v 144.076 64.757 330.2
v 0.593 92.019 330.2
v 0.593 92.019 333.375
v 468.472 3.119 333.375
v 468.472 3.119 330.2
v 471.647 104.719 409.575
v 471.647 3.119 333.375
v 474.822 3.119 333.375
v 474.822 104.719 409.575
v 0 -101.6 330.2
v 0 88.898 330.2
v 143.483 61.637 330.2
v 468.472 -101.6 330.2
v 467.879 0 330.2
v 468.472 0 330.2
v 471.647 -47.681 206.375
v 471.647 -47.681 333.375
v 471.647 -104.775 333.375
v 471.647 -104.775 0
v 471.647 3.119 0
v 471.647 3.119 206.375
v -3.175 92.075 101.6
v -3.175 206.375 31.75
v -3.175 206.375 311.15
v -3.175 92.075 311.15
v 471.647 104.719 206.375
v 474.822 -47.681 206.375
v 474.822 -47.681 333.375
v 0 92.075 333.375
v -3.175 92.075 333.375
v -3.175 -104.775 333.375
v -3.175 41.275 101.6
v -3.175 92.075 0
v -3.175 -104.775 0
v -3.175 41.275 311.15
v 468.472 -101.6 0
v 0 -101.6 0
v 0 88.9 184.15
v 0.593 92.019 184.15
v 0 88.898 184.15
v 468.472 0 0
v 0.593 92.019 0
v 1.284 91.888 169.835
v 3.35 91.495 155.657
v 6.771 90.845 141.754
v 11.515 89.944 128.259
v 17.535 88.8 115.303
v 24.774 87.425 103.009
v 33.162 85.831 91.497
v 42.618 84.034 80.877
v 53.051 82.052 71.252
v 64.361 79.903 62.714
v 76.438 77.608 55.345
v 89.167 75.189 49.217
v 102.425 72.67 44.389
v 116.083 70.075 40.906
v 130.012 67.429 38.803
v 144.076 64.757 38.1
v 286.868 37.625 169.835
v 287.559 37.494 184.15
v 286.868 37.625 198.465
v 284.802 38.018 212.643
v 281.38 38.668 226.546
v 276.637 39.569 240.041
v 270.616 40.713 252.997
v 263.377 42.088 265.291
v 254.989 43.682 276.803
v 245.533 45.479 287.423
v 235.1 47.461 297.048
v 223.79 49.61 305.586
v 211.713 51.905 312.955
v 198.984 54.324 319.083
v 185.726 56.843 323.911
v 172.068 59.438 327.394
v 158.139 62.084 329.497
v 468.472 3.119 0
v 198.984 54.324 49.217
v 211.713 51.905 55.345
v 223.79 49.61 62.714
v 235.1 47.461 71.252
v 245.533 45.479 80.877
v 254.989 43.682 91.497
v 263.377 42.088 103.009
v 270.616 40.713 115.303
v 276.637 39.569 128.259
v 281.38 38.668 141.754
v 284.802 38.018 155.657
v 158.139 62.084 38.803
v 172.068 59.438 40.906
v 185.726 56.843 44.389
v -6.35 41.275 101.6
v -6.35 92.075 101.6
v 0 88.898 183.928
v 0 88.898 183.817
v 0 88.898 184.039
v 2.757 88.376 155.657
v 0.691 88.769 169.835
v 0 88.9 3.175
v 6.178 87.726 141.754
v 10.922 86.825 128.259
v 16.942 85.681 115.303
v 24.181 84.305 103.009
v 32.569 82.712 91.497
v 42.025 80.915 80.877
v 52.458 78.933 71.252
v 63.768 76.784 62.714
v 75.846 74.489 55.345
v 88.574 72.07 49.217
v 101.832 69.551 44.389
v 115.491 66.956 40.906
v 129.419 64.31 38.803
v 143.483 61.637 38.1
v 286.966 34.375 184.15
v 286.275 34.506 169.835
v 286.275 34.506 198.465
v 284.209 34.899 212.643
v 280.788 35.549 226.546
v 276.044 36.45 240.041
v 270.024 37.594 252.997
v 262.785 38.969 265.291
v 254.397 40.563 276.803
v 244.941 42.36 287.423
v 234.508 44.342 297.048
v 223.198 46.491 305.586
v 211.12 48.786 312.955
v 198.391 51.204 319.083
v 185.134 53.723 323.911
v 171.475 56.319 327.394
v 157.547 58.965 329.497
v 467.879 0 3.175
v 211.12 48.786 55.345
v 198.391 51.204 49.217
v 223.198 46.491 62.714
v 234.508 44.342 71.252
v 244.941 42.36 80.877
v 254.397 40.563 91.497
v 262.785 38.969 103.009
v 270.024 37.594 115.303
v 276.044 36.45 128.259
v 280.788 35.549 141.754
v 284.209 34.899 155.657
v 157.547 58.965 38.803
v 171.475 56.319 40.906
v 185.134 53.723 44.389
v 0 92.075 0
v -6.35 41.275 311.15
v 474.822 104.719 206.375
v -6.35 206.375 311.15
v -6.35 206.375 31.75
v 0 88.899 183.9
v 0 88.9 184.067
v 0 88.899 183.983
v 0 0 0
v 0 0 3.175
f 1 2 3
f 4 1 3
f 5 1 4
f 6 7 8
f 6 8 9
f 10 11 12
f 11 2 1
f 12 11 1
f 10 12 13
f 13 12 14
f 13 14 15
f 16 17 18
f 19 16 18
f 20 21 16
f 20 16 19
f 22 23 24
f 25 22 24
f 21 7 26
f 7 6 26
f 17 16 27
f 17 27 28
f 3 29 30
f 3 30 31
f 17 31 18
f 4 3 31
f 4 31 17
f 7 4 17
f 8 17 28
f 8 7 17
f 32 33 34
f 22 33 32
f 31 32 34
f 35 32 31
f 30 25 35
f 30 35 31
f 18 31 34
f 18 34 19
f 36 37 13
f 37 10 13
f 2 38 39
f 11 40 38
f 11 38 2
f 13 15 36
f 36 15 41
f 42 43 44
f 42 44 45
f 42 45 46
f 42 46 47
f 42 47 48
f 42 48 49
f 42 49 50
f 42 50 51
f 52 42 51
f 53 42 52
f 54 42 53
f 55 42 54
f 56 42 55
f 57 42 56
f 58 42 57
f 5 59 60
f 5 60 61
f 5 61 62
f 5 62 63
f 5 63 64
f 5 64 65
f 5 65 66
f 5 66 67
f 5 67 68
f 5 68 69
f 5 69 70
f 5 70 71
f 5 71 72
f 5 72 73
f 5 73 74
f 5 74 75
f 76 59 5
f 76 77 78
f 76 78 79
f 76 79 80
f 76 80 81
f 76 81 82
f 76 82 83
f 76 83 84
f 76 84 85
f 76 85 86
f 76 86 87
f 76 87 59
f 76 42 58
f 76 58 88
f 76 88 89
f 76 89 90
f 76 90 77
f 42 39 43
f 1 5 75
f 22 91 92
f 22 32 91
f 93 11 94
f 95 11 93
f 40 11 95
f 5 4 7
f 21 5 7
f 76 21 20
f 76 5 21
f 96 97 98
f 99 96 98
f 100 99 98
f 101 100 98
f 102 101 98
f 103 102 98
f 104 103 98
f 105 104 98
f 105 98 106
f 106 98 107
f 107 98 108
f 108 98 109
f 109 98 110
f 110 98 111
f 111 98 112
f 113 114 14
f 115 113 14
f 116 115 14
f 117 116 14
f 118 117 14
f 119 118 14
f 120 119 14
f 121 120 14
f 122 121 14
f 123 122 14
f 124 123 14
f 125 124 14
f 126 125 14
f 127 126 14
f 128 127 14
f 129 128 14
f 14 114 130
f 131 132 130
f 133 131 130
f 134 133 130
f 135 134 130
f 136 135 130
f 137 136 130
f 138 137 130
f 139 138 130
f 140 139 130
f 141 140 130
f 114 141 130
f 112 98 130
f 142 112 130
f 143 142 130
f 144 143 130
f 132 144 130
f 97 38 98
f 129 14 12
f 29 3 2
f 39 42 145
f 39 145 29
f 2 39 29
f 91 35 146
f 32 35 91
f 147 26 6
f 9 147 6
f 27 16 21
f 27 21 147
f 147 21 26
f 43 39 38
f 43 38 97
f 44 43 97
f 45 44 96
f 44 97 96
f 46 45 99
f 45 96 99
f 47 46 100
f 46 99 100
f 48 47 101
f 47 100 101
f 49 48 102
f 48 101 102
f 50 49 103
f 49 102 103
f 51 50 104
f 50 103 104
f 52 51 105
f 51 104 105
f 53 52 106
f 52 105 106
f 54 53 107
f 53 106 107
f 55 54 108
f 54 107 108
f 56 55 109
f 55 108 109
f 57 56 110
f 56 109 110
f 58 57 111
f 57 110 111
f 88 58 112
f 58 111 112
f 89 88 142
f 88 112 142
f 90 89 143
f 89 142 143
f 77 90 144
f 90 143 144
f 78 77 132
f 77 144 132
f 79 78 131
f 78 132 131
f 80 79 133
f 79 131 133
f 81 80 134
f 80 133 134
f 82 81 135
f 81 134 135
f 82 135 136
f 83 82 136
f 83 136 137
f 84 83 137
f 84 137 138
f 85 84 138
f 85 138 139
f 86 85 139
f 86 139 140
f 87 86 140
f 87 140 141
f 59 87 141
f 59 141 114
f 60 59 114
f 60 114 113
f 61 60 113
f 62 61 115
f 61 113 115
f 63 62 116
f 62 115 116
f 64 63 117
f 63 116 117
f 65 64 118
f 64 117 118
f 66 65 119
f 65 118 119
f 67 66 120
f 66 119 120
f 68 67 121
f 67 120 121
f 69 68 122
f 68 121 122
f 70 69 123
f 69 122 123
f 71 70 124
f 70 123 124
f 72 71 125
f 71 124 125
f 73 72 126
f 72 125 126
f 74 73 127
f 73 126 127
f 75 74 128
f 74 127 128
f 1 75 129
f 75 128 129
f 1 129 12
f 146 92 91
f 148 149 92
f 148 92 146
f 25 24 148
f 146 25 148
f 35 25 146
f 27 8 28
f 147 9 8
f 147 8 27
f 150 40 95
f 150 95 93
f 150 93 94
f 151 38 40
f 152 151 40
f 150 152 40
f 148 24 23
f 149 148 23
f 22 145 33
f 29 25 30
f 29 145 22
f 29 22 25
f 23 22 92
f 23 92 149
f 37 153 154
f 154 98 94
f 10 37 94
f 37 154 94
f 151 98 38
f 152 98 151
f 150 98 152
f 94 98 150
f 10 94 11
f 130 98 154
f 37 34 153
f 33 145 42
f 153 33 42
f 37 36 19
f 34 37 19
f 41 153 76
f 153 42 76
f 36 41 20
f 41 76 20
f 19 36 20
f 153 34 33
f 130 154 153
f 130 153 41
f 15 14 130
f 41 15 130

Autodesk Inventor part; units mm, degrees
ref_plane "YZ Plane" through (0, 0, 0) normal (1, 0, 0) x (0, 1, 0)
ref_plane "XZ Plane" through (0, 0, 0) normal (0, 1, 0) x (-1, 0, 0)
ref_plane "XY Plane" through (0, 0, 0) normal (0, 0, 1) x (1, 0, 0)
sketch "Sketch1" plane through (0, 0, 0) normal (0, 0, 1) x (1, 0, 0)
  line L0 (0, 0) -> (0, 88.9)
  line L1 (0, 88.9) -> (467.8791, 0)
  line L2 (467.8791, 0) -> (0, 0)
  dimension "d0" = 88.9
  dimension "d4" = 476.25
  dimension "d5" = 90
extrude "Extrusion1" add sketch "Sketch1" along normal blind 3.175
sketch "Sketch2" plane through (0, 88.9, 0) normal (0.1866667, 0.9824233, 0) x (0.9824233, -0.1866667, 0)
  line L0 (0, 0) -> (476.25, 0) projected
  line L1 (0, 0) -> (0, -3.175) projected
  line L2 (476.25, -3.175) -> (0, -3.175) projected
  line L3 (476.25, 0) -> (476.25, -3.175) projected
  line L4 (0, -3.175) -> (0, -330.2)
  line L5 (0, -330.2) -> (476.25, -330.2)
  line L6 (476.25, -330.2) -> (476.25, -3.175)
  point P0 (16.594667, 0)
  dimension "d6" = 330.2
extrude "Extrusion2" add sketch "Sketch2" along normal blind 3.175
sketch "Sketch3" plane through (0, 0, 0) normal (-1, 0, 0) x (0, 0, 1)
  line L0 (0, 0) -> (0, 88.9) projected
  line L1 (0, 0) -> (3.175, 0) projected
  line L2 (3.175, 88.9) -> (3.175, 0) projected
  line L3 (0, 88.9) -> (3.175, 88.9) projected
  line L4 (0, 88.9) -> (0, 92.075)
  line L5 (0, 92.075) -> (330.2, 92.075)
  line L6 (330.2, 92.075) -> (330.2, 0)
  line L7 (330.2, 0) -> (330.2, -101.6)
  line L8 (330.2, -101.6) -> (0, -101.6)
  line L9 (0, -101.6) -> (0, 0)
  dimension "d9" = 3.175
  dimension "d10" = 330.2
  dimension "d11" = 101.6
extrude "Extrusion3" add sketch "Sketch3" along normal blind 3.175
sketch "Sketch4" plane through (0, 0, 0) normal (0, 0, -1) x (-1, 0, 0)
  line L0 (0, 88.9) -> (-0.592667, 92.019194)
  line L1 (0, 92.075) -> (0, 88.9)
  line L2 (-0.592667, 92.019194) -> (0, 92.075)
extrude "Extrusion4" add sketch "Sketch4" against normal blind 330.2
sketch "Sketch5" plane through (0, -101.6, 330.2) normal (0, 0, 1) x (1, 0, 0)
  line L0 (0, 190.5) -> (467.8791, 101.6)
  line L1 (467.8791, 101.6) -> (468.471767, 104.719194)
  line L2 (0.592667, 193.619194) -> (468.471767, 104.719194)
  line L3 (0.592667, 193.619194) -> (0, 193.675)
  line L4 (0, 193.675) -> (-3.175, 193.675)
  line L5 (-3.175, 0) -> (-3.175, 193.675)
  line L6 (0, 0) -> (-3.175, 0)
  line L7 (0, 0) -> (0, 190.5)
  line L8 (468.471767, 104.719194) -> (468.471767, 0)
  line L9 (468.471767, 0) -> (0, 0)
  point P0 (0, 101.6)
extrude "Extrusion5" add sketch "Sketch5" along normal blind 3.175
sketch "Sketch6" plane through (0, -101.6, 330.2) normal (0, 0, -1) x (-1, 0, 0)
  line L0 (-467.8791, 101.6) -> (-468.471767, 104.719194)
  line L1 (-468.471767, 0) -> (-468.471767, 104.719194)
  line L2 (-467.8791, 101.6) -> (-468.471767, 101.6)
  point P0 (0, 101.6)
extrude "Extrusion6" add sketch "Sketch6" along normal blind 330.2
sketch "Sketch7" plane through (468.471767, -101.6, 330.2) normal (1, 0, 0) x (0, 0, -1)
  line L0 (0, 0) -> (0, 101.6)
  line L1 (0, 101.6) -> (330.2, 101.6)
  line L2 (330.2, 104.719194) -> (330.2, 101.6)
  line L3 (-3.175, 104.719194) -> (330.2, 104.719194)
  line L4 (-3.175, 0) -> (-3.175, 104.719194)
  line L5 (0, 0) -> (-3.175, 0)
  line L6 (0, 0) -> (330.2, 0)
  line L7 (330.2, 0) -> (330.2, 101.6)
extrude "Extrusion7" add sketch "Sketch7" along normal blind 3.175
sketch "Sketch8" plane through (0, -101.6, 0) normal (0, -1, 0) x (1, 0, 0)
  line L0 (0, 0) -> (0, 330.2)
  line L1 (471.646767, 333.375) -> (471.646767, 0)
  line L2 (-3.175, 333.375) -> (471.646767, 333.375)
  line L3 (-3.175, 0) -> (-3.175, 333.375)
  line L4 (0, 0) -> (-3.175, 0)
  line L5 (0, 0) -> (471.646767, 0)
extrude "Extrusion8" add sketch "Sketch8" along normal blind 3.175
sketch "Sketch9" plane through (0, 88.9, 0) normal (-0.1866667, -0.9824233, 0) x (0.9824233, -0.1866667, 0)
  line L0 (0, 330.2) -> (476.25, 330.2) projected
  line L1 (0, 3.175) -> (0, 330.2) projected
  arc A0 (0, 184.15) -> (146.05, 330.2) centre (146.05, 184.15) ccw
  point P0 (16.594667, 0)
  dimension "d24" = 292.1
extrude "Extrusion9" cut sketch "Sketch9" against normal blind 3.175
sketch "Sketch10" plane through (471.646767, -101.6, 330.2) normal (1, 0, 0) x (0, 0, -1)
  line L0 (330.2, 104.719194) -> (-3.175, 104.719194)
  line L1 (-3.175, 104.719194) -> (-3.175, -3.175)
  line L2 (330.2, -3.175) -> (-3.175, -3.175)
  line L3 (123.825, 53.919194) -> (123.825, 206.319194)
  line L4 (123.825, 206.319194) -> (-79.375, 206.319194)
  line L5 (123.825, 53.919194) -> (-3.175, 53.919194)
  line L6 (-3.175, 53.919194) -> (-3.175, 104.719194)
  line L7 (-3.175, 104.719194) -> (-3.175, 104.719194)
  line L8 (-3.175, 104.719194) -> (-79.375, 206.319194)
  point P0 (330.2, 101.6)
  dimension "d30" = 152.4
  dimension "d31" = 203.2
  dimension "d32" = 127
  dimension "d33" = 50.8
  dimension "d34" = 0
  dimension "d35" = 0
  dimension "d47" = 0
extrude "Extrusion10" add sketch "Sketch10" along normal blind 3.175
sketch "Sketch11" plane through (-3.175, 0, 0) normal (-1, 0, 0) x (0, 0, 1)
  line L0 (333.375, 92.075) -> (333.375, -104.775) projected
  line L1 (0, 92.075) -> (333.375, 92.075) projected
  line L2 (311.15, 206.375) -> (31.75, 206.375)
  line L3 (311.15, 206.375) -> (311.15, 41.275)
  line L4 (311.15, 41.275) -> (101.6, 41.275)
  line L5 (101.6, 41.275) -> (101.6, 92.075)
  line L6 (101.6, 92.075) -> (31.75, 206.375)
  point P0 (0, 0)
  dimension "d39" = 279.4
  dimension "d40" = 165.1
  dimension "d41" = 209.55
  dimension "d42" = 50.8
  dimension "d43" = 0
  dimension "d44" = 22.225
extrude "Extrusion11" add sketch "Sketch11" along normal blind 3.175
properties part number "Hopper" material "Glass"
